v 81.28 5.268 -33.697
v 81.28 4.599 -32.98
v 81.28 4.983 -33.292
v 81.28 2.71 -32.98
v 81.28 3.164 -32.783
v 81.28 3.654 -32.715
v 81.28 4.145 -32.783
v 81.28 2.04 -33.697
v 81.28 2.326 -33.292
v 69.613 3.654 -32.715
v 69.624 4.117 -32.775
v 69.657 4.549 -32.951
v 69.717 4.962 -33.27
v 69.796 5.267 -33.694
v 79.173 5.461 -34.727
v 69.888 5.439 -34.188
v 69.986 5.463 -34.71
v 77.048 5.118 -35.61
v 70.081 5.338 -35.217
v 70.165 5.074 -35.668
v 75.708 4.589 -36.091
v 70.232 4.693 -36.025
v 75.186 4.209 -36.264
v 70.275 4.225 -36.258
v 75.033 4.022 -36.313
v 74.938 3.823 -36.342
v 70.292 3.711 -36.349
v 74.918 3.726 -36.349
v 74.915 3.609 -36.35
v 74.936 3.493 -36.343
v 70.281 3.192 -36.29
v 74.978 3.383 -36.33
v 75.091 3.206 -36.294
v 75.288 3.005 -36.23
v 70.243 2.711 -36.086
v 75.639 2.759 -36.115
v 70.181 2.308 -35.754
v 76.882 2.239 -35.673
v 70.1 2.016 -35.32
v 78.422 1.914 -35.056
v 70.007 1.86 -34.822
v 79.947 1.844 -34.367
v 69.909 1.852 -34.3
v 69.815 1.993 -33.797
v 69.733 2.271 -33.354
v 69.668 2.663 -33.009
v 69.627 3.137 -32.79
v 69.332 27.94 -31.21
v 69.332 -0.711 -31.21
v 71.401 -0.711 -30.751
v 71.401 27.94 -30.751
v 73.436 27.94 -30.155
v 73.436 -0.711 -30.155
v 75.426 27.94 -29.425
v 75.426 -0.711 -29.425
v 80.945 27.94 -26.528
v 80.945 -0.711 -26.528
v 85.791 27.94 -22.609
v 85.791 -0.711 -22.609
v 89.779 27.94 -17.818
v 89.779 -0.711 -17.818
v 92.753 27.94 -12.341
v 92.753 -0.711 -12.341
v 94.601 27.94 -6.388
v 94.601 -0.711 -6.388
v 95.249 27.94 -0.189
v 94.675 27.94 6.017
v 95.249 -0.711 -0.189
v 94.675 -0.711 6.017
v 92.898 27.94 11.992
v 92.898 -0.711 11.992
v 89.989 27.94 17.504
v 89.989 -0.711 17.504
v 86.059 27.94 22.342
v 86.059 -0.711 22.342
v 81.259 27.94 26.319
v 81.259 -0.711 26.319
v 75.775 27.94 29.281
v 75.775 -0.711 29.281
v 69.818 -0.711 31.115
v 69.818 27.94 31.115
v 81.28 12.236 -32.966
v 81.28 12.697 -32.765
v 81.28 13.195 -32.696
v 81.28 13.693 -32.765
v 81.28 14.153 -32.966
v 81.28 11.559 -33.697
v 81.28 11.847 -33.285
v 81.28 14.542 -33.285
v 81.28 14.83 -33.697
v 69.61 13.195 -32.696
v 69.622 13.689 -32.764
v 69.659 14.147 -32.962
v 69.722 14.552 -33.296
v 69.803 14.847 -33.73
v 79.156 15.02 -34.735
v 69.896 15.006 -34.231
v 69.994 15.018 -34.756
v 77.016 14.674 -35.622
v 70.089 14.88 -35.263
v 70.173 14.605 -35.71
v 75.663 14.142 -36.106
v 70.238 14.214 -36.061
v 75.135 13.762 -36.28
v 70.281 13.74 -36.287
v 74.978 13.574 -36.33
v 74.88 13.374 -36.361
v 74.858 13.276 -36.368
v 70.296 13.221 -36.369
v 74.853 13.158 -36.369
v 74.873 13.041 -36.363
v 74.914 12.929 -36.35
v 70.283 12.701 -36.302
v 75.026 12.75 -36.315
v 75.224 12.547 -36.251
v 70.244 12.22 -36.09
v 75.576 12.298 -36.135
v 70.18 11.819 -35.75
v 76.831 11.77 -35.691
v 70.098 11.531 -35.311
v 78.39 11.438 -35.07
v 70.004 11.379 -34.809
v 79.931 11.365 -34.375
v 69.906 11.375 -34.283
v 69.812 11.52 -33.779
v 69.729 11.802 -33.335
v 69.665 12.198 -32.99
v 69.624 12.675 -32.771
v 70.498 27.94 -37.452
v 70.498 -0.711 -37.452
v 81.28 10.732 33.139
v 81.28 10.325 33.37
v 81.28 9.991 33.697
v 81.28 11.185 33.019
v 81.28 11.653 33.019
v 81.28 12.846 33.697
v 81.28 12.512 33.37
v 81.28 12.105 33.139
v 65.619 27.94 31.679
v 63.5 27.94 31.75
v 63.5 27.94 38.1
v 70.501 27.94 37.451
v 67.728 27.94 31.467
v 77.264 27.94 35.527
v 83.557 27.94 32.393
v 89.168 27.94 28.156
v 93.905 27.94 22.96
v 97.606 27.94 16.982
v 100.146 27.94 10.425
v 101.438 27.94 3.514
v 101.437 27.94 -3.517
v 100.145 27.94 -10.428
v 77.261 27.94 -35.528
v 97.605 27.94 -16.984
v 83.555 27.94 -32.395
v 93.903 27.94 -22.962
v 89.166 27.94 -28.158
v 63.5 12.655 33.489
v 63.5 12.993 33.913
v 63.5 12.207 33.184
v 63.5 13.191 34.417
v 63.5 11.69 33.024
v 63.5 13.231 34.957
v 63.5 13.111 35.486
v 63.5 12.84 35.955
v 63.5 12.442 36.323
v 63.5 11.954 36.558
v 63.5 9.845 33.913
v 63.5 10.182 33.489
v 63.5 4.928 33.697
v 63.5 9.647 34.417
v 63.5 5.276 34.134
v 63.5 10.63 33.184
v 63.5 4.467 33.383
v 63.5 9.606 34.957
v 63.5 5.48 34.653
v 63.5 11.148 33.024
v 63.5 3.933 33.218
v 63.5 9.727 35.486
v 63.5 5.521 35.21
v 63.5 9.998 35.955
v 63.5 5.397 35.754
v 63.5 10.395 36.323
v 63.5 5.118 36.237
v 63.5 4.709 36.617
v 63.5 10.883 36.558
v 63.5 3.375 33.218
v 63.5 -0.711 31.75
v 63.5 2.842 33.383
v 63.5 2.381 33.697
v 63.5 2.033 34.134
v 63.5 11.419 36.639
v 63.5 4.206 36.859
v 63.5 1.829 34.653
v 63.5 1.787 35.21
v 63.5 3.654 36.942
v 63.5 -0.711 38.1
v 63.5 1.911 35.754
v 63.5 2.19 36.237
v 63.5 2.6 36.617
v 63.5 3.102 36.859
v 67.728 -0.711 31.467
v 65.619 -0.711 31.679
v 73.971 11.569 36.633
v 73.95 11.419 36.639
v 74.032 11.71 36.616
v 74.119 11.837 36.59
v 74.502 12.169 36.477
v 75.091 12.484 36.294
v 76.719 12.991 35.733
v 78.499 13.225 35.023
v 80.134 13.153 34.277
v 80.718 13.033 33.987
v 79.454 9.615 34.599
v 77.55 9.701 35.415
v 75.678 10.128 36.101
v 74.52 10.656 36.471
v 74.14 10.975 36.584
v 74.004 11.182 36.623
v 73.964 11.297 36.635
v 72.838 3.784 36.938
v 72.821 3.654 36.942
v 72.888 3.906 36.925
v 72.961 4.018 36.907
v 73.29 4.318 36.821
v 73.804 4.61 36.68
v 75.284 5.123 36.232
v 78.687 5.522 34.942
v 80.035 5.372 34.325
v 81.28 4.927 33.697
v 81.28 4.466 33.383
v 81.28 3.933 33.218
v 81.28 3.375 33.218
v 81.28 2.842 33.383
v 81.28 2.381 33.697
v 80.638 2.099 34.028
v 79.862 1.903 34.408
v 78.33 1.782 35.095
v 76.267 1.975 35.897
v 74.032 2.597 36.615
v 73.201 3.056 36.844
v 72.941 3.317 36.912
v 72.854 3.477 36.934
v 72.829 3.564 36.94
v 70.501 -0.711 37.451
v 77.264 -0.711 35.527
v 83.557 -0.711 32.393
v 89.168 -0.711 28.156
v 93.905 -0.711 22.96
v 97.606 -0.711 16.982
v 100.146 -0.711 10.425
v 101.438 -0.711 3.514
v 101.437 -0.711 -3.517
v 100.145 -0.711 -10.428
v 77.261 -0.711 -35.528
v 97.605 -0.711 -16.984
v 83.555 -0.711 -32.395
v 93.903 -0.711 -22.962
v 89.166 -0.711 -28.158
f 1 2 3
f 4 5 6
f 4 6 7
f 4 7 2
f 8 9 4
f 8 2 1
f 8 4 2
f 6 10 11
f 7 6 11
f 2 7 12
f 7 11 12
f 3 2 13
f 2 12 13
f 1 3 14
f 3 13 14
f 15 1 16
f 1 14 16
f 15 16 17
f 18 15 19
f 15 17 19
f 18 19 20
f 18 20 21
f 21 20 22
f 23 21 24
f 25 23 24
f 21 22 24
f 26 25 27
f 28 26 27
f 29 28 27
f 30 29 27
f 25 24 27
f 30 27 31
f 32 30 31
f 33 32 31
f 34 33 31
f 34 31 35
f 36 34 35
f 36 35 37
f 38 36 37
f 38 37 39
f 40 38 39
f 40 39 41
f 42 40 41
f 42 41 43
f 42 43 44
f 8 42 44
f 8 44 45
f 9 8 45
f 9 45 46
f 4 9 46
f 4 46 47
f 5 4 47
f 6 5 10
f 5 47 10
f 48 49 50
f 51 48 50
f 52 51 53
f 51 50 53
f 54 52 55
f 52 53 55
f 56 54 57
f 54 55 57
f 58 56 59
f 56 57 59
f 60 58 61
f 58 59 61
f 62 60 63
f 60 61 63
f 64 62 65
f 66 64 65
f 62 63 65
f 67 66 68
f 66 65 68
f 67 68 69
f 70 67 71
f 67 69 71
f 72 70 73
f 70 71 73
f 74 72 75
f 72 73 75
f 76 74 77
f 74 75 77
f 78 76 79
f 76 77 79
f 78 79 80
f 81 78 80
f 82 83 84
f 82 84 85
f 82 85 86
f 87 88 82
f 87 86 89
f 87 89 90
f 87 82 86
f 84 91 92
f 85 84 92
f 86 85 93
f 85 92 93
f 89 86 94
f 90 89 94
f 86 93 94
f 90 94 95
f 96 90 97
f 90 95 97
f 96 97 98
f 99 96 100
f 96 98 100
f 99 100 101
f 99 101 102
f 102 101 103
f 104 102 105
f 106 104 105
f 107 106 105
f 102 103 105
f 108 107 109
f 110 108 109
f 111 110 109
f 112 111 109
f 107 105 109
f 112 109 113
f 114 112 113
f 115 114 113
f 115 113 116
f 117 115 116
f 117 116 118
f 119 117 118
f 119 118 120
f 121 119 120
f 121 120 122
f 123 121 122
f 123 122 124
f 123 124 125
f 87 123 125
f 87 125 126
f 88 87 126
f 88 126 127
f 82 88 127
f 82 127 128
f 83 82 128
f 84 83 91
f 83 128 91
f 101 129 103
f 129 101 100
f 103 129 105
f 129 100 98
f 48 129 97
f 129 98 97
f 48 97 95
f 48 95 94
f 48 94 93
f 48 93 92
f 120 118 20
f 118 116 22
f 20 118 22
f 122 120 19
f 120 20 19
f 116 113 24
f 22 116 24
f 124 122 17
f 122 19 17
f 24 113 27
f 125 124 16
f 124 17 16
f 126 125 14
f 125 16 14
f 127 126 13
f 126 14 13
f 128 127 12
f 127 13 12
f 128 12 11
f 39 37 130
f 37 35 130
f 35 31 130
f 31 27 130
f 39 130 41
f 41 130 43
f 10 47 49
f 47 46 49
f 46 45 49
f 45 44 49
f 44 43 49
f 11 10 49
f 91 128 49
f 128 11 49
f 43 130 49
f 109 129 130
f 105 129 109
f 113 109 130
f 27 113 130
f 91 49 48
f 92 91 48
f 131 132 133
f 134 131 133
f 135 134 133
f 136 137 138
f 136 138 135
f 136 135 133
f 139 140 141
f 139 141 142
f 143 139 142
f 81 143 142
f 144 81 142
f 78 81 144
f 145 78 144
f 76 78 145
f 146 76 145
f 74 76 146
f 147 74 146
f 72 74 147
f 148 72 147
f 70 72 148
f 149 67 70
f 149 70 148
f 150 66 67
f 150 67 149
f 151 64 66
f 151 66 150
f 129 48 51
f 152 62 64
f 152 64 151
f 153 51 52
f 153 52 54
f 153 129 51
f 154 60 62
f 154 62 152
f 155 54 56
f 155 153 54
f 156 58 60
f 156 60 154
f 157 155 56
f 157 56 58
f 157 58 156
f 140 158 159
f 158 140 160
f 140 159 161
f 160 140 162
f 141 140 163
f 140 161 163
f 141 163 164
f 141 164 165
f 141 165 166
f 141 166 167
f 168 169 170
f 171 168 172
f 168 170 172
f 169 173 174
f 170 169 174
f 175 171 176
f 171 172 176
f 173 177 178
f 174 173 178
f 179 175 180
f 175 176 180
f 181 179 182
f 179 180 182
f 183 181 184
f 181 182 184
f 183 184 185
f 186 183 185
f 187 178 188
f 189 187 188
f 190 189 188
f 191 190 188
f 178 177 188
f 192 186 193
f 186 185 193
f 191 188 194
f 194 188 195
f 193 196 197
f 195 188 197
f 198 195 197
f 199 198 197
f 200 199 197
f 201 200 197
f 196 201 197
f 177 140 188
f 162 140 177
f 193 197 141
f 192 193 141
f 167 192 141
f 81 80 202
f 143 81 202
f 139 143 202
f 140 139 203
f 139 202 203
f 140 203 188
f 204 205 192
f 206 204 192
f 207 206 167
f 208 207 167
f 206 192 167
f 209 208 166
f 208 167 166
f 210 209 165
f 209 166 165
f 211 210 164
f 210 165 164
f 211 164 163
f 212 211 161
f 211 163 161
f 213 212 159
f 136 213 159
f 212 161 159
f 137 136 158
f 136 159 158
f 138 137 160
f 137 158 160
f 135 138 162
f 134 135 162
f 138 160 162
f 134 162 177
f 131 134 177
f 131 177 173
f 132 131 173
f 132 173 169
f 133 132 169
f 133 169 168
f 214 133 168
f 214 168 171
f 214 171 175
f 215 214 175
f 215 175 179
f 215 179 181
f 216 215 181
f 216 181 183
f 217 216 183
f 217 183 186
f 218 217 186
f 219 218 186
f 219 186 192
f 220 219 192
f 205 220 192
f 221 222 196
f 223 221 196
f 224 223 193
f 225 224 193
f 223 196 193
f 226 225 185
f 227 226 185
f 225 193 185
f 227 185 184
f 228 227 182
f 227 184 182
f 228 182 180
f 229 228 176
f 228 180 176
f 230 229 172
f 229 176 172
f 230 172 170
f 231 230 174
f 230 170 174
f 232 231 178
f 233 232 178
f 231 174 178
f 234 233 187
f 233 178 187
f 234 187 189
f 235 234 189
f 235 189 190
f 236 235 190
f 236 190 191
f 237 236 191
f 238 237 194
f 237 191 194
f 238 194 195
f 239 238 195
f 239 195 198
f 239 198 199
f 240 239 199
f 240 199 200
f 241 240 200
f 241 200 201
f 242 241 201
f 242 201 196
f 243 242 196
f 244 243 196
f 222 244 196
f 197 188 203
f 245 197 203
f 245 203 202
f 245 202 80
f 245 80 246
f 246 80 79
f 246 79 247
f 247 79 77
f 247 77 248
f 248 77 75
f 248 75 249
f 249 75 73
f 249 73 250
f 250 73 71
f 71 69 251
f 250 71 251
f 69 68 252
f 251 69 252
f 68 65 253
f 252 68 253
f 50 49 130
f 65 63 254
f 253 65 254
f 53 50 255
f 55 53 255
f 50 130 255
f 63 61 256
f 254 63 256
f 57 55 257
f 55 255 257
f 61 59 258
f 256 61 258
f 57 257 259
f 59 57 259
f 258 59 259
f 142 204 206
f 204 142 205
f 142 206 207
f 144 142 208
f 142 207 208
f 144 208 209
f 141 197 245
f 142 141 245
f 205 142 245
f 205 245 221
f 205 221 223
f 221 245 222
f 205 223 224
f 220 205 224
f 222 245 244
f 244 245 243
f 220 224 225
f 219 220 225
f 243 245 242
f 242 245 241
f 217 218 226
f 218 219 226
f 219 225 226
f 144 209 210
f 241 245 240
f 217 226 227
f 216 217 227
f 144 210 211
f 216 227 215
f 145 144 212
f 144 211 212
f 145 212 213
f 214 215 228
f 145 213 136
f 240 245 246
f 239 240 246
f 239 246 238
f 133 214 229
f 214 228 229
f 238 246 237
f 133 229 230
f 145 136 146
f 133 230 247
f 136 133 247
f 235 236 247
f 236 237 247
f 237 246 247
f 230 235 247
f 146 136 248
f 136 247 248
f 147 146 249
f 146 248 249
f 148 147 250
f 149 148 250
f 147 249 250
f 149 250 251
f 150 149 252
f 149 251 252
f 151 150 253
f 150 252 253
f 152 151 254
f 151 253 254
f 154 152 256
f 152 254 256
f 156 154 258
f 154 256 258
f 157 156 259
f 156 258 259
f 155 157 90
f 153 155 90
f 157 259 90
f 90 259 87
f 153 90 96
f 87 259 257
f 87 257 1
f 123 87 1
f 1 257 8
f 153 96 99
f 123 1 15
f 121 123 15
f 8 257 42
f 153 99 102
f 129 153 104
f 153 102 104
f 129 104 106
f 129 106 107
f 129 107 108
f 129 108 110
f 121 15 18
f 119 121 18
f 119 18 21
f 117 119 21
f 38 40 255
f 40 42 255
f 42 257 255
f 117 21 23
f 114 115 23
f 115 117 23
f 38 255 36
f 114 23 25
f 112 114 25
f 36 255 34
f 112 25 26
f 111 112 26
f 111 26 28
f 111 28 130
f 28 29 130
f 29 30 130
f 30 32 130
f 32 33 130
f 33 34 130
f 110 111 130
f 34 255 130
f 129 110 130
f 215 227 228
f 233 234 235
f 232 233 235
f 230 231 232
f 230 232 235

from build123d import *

# Parameters (mm, degrees)
BOSS_EXTRUDE1_DEPTH     = 27.94
CUT_EXTRUDE1_DEPTH      = 17.78
CUT_EXTRUDE1_DEPTH_BACK = 17.78
SKETCH2_R               = 1.5
SKETCH2_R_2             = 1.554918768
SKETCH2_R_3             = 1.519223358
SKETCH2_3_R             = 1.8175
SKETCH2_3_R_2           = 1.5
SKETCH2_3_R_3           = 1.872418768
SKETCH2_3_R_4           = 1.554918768
SKETCH2_3_R_5           = 1.836723358
SKETCH2_3_R_6           = 1.519223358
CUT_EXTRUDE2_DEPTH      = 17.78
BOSS_EXTRUDE2_START     = -0.7112
BOSS_EXTRUDE2_DEPTH     = 0.7112


with BuildPart() as part:
    # Sketch1 → Boss-Extrude1 (new body)
    with BuildSketch(Plane(origin=(0, 0, 0), x_dir=(1, 0, 0), z_dir=(0, 1, 0))):
        with BuildLine():
            Line((70.498234913, 37.451765087), (69.331862428, 31.209804239))
            ThreePointArc((69.331862428, 31.209804239), (72.423610275, 30.470176889), (75.425897806, 29.425082184))
            ThreePointArc((75.425897806, 29.425082184), (95.114662615, -2.928413856), (69.818170226, -31.115))
            ThreePointArc((69.818170226, -31.115), (66.675, -31.590851128), (63.5, -31.75))
            Line((63.5, -31.75), (63.5, -38.1))
            ThreePointArc((63.5, -38.1), (101.437595139, -3.514096627), (70.498234913, 37.451765087))
        make_face()
    extrude(amount=BOSS_EXTRUDE1_DEPTH)

    # Sketch2 → Cut-Extrude1 (cut, two sides: drawn at the far end of the back side and taken through both)
    with BuildSketch(Plane.ZY.offset(-63.5).offset(-CUT_EXTRUDE1_DEPTH_BACK)):
        with Locations((34.821497506, 11.418652896)):
            Circle(SKETCH2_R)
        with Locations((35.069922057, 3.654275356)):
            Circle(SKETCH2_R_2)
        with Locations((-34.532766251, 13.194759825)):
            Circle(SKETCH2_R_3)
        with Locations((-34.532766251, 3.654275356)):
            Circle(SKETCH2_R)
    extrude(amount=CUT_EXTRUDE1_DEPTH + CUT_EXTRUDE1_DEPTH_BACK, mode=Mode.SUBTRACT)

    # Sketch2<3> → Cut-Extrude2 (cut)
    # profile 1 of 4: a face of its own
    with BuildSketch(Plane.ZY.offset(-63.5)):
        with Locations((34.821497506, 11.418652896)):
            Circle(SKETCH2_3_R)
        with Locations((34.821497506, 11.418652896)):
            Circle(SKETCH2_3_R_2, mode=Mode.SUBTRACT)
    # profile 2 of 4: a face of its own
    with BuildSketch(Plane.ZY.offset(-63.5)):
        with Locations((35.069922057, 3.654275356)):
            Circle(SKETCH2_3_R_3)
        with Locations((35.069922057, 3.654275356)):
            Circle(SKETCH2_3_R_4, mode=Mode.SUBTRACT)
    # profile 3 of 4: a face of its own
    with BuildSketch(Plane.ZY.offset(-63.5)):
        with Locations((-34.532766251, 13.194759825)):
            Circle(SKETCH2_3_R_5)
        with Locations((-34.532766251, 13.194759825)):
            Circle(SKETCH2_3_R_6, mode=Mode.SUBTRACT)
    # profile 4 of 4: a face of its own
    with BuildSketch(Plane.ZY.offset(-63.5)):
        with Locations((-34.532766251, 3.654275356)):
            Circle(SKETCH2_3_R)
        with Locations((-34.532766251, 3.654275356)):
            Circle(SKETCH2_3_R_2, mode=Mode.SUBTRACT)
    extrude(amount=-CUT_EXTRUDE2_DEPTH, mode=Mode.SUBTRACT)

    # Sketch1<2> → Boss-Extrude2 (add)
    with BuildSketch(Plane(origin=(0, 0, 0), x_dir=(1, 0, 0), z_dir=(0, 1, 0)).offset(BOSS_EXTRUDE2_START)):
        with BuildLine():
            Line((70.498234913, 37.451765087), (69.331862428, 31.209804239))
            ThreePointArc((69.331862428, 31.209804239), (72.423610275, 30.470176889), (75.425897806, 29.425082184))
            ThreePointArc((75.425897806, 29.425082184), (95.114662615, -2.928413856), (69.818170226, -31.115))
            ThreePointArc((69.818170226, -31.115), (66.675, -31.590851128), (63.5, -31.75))
            Line((63.5, -31.75), (63.5, -38.1))
            ThreePointArc((63.5, -38.1), (101.437595139, -3.514096627), (70.498234913, 37.451765087))
        make_face()
    extrude(amount=BOSS_EXTRUDE2_DEPTH)


solid = part.part
